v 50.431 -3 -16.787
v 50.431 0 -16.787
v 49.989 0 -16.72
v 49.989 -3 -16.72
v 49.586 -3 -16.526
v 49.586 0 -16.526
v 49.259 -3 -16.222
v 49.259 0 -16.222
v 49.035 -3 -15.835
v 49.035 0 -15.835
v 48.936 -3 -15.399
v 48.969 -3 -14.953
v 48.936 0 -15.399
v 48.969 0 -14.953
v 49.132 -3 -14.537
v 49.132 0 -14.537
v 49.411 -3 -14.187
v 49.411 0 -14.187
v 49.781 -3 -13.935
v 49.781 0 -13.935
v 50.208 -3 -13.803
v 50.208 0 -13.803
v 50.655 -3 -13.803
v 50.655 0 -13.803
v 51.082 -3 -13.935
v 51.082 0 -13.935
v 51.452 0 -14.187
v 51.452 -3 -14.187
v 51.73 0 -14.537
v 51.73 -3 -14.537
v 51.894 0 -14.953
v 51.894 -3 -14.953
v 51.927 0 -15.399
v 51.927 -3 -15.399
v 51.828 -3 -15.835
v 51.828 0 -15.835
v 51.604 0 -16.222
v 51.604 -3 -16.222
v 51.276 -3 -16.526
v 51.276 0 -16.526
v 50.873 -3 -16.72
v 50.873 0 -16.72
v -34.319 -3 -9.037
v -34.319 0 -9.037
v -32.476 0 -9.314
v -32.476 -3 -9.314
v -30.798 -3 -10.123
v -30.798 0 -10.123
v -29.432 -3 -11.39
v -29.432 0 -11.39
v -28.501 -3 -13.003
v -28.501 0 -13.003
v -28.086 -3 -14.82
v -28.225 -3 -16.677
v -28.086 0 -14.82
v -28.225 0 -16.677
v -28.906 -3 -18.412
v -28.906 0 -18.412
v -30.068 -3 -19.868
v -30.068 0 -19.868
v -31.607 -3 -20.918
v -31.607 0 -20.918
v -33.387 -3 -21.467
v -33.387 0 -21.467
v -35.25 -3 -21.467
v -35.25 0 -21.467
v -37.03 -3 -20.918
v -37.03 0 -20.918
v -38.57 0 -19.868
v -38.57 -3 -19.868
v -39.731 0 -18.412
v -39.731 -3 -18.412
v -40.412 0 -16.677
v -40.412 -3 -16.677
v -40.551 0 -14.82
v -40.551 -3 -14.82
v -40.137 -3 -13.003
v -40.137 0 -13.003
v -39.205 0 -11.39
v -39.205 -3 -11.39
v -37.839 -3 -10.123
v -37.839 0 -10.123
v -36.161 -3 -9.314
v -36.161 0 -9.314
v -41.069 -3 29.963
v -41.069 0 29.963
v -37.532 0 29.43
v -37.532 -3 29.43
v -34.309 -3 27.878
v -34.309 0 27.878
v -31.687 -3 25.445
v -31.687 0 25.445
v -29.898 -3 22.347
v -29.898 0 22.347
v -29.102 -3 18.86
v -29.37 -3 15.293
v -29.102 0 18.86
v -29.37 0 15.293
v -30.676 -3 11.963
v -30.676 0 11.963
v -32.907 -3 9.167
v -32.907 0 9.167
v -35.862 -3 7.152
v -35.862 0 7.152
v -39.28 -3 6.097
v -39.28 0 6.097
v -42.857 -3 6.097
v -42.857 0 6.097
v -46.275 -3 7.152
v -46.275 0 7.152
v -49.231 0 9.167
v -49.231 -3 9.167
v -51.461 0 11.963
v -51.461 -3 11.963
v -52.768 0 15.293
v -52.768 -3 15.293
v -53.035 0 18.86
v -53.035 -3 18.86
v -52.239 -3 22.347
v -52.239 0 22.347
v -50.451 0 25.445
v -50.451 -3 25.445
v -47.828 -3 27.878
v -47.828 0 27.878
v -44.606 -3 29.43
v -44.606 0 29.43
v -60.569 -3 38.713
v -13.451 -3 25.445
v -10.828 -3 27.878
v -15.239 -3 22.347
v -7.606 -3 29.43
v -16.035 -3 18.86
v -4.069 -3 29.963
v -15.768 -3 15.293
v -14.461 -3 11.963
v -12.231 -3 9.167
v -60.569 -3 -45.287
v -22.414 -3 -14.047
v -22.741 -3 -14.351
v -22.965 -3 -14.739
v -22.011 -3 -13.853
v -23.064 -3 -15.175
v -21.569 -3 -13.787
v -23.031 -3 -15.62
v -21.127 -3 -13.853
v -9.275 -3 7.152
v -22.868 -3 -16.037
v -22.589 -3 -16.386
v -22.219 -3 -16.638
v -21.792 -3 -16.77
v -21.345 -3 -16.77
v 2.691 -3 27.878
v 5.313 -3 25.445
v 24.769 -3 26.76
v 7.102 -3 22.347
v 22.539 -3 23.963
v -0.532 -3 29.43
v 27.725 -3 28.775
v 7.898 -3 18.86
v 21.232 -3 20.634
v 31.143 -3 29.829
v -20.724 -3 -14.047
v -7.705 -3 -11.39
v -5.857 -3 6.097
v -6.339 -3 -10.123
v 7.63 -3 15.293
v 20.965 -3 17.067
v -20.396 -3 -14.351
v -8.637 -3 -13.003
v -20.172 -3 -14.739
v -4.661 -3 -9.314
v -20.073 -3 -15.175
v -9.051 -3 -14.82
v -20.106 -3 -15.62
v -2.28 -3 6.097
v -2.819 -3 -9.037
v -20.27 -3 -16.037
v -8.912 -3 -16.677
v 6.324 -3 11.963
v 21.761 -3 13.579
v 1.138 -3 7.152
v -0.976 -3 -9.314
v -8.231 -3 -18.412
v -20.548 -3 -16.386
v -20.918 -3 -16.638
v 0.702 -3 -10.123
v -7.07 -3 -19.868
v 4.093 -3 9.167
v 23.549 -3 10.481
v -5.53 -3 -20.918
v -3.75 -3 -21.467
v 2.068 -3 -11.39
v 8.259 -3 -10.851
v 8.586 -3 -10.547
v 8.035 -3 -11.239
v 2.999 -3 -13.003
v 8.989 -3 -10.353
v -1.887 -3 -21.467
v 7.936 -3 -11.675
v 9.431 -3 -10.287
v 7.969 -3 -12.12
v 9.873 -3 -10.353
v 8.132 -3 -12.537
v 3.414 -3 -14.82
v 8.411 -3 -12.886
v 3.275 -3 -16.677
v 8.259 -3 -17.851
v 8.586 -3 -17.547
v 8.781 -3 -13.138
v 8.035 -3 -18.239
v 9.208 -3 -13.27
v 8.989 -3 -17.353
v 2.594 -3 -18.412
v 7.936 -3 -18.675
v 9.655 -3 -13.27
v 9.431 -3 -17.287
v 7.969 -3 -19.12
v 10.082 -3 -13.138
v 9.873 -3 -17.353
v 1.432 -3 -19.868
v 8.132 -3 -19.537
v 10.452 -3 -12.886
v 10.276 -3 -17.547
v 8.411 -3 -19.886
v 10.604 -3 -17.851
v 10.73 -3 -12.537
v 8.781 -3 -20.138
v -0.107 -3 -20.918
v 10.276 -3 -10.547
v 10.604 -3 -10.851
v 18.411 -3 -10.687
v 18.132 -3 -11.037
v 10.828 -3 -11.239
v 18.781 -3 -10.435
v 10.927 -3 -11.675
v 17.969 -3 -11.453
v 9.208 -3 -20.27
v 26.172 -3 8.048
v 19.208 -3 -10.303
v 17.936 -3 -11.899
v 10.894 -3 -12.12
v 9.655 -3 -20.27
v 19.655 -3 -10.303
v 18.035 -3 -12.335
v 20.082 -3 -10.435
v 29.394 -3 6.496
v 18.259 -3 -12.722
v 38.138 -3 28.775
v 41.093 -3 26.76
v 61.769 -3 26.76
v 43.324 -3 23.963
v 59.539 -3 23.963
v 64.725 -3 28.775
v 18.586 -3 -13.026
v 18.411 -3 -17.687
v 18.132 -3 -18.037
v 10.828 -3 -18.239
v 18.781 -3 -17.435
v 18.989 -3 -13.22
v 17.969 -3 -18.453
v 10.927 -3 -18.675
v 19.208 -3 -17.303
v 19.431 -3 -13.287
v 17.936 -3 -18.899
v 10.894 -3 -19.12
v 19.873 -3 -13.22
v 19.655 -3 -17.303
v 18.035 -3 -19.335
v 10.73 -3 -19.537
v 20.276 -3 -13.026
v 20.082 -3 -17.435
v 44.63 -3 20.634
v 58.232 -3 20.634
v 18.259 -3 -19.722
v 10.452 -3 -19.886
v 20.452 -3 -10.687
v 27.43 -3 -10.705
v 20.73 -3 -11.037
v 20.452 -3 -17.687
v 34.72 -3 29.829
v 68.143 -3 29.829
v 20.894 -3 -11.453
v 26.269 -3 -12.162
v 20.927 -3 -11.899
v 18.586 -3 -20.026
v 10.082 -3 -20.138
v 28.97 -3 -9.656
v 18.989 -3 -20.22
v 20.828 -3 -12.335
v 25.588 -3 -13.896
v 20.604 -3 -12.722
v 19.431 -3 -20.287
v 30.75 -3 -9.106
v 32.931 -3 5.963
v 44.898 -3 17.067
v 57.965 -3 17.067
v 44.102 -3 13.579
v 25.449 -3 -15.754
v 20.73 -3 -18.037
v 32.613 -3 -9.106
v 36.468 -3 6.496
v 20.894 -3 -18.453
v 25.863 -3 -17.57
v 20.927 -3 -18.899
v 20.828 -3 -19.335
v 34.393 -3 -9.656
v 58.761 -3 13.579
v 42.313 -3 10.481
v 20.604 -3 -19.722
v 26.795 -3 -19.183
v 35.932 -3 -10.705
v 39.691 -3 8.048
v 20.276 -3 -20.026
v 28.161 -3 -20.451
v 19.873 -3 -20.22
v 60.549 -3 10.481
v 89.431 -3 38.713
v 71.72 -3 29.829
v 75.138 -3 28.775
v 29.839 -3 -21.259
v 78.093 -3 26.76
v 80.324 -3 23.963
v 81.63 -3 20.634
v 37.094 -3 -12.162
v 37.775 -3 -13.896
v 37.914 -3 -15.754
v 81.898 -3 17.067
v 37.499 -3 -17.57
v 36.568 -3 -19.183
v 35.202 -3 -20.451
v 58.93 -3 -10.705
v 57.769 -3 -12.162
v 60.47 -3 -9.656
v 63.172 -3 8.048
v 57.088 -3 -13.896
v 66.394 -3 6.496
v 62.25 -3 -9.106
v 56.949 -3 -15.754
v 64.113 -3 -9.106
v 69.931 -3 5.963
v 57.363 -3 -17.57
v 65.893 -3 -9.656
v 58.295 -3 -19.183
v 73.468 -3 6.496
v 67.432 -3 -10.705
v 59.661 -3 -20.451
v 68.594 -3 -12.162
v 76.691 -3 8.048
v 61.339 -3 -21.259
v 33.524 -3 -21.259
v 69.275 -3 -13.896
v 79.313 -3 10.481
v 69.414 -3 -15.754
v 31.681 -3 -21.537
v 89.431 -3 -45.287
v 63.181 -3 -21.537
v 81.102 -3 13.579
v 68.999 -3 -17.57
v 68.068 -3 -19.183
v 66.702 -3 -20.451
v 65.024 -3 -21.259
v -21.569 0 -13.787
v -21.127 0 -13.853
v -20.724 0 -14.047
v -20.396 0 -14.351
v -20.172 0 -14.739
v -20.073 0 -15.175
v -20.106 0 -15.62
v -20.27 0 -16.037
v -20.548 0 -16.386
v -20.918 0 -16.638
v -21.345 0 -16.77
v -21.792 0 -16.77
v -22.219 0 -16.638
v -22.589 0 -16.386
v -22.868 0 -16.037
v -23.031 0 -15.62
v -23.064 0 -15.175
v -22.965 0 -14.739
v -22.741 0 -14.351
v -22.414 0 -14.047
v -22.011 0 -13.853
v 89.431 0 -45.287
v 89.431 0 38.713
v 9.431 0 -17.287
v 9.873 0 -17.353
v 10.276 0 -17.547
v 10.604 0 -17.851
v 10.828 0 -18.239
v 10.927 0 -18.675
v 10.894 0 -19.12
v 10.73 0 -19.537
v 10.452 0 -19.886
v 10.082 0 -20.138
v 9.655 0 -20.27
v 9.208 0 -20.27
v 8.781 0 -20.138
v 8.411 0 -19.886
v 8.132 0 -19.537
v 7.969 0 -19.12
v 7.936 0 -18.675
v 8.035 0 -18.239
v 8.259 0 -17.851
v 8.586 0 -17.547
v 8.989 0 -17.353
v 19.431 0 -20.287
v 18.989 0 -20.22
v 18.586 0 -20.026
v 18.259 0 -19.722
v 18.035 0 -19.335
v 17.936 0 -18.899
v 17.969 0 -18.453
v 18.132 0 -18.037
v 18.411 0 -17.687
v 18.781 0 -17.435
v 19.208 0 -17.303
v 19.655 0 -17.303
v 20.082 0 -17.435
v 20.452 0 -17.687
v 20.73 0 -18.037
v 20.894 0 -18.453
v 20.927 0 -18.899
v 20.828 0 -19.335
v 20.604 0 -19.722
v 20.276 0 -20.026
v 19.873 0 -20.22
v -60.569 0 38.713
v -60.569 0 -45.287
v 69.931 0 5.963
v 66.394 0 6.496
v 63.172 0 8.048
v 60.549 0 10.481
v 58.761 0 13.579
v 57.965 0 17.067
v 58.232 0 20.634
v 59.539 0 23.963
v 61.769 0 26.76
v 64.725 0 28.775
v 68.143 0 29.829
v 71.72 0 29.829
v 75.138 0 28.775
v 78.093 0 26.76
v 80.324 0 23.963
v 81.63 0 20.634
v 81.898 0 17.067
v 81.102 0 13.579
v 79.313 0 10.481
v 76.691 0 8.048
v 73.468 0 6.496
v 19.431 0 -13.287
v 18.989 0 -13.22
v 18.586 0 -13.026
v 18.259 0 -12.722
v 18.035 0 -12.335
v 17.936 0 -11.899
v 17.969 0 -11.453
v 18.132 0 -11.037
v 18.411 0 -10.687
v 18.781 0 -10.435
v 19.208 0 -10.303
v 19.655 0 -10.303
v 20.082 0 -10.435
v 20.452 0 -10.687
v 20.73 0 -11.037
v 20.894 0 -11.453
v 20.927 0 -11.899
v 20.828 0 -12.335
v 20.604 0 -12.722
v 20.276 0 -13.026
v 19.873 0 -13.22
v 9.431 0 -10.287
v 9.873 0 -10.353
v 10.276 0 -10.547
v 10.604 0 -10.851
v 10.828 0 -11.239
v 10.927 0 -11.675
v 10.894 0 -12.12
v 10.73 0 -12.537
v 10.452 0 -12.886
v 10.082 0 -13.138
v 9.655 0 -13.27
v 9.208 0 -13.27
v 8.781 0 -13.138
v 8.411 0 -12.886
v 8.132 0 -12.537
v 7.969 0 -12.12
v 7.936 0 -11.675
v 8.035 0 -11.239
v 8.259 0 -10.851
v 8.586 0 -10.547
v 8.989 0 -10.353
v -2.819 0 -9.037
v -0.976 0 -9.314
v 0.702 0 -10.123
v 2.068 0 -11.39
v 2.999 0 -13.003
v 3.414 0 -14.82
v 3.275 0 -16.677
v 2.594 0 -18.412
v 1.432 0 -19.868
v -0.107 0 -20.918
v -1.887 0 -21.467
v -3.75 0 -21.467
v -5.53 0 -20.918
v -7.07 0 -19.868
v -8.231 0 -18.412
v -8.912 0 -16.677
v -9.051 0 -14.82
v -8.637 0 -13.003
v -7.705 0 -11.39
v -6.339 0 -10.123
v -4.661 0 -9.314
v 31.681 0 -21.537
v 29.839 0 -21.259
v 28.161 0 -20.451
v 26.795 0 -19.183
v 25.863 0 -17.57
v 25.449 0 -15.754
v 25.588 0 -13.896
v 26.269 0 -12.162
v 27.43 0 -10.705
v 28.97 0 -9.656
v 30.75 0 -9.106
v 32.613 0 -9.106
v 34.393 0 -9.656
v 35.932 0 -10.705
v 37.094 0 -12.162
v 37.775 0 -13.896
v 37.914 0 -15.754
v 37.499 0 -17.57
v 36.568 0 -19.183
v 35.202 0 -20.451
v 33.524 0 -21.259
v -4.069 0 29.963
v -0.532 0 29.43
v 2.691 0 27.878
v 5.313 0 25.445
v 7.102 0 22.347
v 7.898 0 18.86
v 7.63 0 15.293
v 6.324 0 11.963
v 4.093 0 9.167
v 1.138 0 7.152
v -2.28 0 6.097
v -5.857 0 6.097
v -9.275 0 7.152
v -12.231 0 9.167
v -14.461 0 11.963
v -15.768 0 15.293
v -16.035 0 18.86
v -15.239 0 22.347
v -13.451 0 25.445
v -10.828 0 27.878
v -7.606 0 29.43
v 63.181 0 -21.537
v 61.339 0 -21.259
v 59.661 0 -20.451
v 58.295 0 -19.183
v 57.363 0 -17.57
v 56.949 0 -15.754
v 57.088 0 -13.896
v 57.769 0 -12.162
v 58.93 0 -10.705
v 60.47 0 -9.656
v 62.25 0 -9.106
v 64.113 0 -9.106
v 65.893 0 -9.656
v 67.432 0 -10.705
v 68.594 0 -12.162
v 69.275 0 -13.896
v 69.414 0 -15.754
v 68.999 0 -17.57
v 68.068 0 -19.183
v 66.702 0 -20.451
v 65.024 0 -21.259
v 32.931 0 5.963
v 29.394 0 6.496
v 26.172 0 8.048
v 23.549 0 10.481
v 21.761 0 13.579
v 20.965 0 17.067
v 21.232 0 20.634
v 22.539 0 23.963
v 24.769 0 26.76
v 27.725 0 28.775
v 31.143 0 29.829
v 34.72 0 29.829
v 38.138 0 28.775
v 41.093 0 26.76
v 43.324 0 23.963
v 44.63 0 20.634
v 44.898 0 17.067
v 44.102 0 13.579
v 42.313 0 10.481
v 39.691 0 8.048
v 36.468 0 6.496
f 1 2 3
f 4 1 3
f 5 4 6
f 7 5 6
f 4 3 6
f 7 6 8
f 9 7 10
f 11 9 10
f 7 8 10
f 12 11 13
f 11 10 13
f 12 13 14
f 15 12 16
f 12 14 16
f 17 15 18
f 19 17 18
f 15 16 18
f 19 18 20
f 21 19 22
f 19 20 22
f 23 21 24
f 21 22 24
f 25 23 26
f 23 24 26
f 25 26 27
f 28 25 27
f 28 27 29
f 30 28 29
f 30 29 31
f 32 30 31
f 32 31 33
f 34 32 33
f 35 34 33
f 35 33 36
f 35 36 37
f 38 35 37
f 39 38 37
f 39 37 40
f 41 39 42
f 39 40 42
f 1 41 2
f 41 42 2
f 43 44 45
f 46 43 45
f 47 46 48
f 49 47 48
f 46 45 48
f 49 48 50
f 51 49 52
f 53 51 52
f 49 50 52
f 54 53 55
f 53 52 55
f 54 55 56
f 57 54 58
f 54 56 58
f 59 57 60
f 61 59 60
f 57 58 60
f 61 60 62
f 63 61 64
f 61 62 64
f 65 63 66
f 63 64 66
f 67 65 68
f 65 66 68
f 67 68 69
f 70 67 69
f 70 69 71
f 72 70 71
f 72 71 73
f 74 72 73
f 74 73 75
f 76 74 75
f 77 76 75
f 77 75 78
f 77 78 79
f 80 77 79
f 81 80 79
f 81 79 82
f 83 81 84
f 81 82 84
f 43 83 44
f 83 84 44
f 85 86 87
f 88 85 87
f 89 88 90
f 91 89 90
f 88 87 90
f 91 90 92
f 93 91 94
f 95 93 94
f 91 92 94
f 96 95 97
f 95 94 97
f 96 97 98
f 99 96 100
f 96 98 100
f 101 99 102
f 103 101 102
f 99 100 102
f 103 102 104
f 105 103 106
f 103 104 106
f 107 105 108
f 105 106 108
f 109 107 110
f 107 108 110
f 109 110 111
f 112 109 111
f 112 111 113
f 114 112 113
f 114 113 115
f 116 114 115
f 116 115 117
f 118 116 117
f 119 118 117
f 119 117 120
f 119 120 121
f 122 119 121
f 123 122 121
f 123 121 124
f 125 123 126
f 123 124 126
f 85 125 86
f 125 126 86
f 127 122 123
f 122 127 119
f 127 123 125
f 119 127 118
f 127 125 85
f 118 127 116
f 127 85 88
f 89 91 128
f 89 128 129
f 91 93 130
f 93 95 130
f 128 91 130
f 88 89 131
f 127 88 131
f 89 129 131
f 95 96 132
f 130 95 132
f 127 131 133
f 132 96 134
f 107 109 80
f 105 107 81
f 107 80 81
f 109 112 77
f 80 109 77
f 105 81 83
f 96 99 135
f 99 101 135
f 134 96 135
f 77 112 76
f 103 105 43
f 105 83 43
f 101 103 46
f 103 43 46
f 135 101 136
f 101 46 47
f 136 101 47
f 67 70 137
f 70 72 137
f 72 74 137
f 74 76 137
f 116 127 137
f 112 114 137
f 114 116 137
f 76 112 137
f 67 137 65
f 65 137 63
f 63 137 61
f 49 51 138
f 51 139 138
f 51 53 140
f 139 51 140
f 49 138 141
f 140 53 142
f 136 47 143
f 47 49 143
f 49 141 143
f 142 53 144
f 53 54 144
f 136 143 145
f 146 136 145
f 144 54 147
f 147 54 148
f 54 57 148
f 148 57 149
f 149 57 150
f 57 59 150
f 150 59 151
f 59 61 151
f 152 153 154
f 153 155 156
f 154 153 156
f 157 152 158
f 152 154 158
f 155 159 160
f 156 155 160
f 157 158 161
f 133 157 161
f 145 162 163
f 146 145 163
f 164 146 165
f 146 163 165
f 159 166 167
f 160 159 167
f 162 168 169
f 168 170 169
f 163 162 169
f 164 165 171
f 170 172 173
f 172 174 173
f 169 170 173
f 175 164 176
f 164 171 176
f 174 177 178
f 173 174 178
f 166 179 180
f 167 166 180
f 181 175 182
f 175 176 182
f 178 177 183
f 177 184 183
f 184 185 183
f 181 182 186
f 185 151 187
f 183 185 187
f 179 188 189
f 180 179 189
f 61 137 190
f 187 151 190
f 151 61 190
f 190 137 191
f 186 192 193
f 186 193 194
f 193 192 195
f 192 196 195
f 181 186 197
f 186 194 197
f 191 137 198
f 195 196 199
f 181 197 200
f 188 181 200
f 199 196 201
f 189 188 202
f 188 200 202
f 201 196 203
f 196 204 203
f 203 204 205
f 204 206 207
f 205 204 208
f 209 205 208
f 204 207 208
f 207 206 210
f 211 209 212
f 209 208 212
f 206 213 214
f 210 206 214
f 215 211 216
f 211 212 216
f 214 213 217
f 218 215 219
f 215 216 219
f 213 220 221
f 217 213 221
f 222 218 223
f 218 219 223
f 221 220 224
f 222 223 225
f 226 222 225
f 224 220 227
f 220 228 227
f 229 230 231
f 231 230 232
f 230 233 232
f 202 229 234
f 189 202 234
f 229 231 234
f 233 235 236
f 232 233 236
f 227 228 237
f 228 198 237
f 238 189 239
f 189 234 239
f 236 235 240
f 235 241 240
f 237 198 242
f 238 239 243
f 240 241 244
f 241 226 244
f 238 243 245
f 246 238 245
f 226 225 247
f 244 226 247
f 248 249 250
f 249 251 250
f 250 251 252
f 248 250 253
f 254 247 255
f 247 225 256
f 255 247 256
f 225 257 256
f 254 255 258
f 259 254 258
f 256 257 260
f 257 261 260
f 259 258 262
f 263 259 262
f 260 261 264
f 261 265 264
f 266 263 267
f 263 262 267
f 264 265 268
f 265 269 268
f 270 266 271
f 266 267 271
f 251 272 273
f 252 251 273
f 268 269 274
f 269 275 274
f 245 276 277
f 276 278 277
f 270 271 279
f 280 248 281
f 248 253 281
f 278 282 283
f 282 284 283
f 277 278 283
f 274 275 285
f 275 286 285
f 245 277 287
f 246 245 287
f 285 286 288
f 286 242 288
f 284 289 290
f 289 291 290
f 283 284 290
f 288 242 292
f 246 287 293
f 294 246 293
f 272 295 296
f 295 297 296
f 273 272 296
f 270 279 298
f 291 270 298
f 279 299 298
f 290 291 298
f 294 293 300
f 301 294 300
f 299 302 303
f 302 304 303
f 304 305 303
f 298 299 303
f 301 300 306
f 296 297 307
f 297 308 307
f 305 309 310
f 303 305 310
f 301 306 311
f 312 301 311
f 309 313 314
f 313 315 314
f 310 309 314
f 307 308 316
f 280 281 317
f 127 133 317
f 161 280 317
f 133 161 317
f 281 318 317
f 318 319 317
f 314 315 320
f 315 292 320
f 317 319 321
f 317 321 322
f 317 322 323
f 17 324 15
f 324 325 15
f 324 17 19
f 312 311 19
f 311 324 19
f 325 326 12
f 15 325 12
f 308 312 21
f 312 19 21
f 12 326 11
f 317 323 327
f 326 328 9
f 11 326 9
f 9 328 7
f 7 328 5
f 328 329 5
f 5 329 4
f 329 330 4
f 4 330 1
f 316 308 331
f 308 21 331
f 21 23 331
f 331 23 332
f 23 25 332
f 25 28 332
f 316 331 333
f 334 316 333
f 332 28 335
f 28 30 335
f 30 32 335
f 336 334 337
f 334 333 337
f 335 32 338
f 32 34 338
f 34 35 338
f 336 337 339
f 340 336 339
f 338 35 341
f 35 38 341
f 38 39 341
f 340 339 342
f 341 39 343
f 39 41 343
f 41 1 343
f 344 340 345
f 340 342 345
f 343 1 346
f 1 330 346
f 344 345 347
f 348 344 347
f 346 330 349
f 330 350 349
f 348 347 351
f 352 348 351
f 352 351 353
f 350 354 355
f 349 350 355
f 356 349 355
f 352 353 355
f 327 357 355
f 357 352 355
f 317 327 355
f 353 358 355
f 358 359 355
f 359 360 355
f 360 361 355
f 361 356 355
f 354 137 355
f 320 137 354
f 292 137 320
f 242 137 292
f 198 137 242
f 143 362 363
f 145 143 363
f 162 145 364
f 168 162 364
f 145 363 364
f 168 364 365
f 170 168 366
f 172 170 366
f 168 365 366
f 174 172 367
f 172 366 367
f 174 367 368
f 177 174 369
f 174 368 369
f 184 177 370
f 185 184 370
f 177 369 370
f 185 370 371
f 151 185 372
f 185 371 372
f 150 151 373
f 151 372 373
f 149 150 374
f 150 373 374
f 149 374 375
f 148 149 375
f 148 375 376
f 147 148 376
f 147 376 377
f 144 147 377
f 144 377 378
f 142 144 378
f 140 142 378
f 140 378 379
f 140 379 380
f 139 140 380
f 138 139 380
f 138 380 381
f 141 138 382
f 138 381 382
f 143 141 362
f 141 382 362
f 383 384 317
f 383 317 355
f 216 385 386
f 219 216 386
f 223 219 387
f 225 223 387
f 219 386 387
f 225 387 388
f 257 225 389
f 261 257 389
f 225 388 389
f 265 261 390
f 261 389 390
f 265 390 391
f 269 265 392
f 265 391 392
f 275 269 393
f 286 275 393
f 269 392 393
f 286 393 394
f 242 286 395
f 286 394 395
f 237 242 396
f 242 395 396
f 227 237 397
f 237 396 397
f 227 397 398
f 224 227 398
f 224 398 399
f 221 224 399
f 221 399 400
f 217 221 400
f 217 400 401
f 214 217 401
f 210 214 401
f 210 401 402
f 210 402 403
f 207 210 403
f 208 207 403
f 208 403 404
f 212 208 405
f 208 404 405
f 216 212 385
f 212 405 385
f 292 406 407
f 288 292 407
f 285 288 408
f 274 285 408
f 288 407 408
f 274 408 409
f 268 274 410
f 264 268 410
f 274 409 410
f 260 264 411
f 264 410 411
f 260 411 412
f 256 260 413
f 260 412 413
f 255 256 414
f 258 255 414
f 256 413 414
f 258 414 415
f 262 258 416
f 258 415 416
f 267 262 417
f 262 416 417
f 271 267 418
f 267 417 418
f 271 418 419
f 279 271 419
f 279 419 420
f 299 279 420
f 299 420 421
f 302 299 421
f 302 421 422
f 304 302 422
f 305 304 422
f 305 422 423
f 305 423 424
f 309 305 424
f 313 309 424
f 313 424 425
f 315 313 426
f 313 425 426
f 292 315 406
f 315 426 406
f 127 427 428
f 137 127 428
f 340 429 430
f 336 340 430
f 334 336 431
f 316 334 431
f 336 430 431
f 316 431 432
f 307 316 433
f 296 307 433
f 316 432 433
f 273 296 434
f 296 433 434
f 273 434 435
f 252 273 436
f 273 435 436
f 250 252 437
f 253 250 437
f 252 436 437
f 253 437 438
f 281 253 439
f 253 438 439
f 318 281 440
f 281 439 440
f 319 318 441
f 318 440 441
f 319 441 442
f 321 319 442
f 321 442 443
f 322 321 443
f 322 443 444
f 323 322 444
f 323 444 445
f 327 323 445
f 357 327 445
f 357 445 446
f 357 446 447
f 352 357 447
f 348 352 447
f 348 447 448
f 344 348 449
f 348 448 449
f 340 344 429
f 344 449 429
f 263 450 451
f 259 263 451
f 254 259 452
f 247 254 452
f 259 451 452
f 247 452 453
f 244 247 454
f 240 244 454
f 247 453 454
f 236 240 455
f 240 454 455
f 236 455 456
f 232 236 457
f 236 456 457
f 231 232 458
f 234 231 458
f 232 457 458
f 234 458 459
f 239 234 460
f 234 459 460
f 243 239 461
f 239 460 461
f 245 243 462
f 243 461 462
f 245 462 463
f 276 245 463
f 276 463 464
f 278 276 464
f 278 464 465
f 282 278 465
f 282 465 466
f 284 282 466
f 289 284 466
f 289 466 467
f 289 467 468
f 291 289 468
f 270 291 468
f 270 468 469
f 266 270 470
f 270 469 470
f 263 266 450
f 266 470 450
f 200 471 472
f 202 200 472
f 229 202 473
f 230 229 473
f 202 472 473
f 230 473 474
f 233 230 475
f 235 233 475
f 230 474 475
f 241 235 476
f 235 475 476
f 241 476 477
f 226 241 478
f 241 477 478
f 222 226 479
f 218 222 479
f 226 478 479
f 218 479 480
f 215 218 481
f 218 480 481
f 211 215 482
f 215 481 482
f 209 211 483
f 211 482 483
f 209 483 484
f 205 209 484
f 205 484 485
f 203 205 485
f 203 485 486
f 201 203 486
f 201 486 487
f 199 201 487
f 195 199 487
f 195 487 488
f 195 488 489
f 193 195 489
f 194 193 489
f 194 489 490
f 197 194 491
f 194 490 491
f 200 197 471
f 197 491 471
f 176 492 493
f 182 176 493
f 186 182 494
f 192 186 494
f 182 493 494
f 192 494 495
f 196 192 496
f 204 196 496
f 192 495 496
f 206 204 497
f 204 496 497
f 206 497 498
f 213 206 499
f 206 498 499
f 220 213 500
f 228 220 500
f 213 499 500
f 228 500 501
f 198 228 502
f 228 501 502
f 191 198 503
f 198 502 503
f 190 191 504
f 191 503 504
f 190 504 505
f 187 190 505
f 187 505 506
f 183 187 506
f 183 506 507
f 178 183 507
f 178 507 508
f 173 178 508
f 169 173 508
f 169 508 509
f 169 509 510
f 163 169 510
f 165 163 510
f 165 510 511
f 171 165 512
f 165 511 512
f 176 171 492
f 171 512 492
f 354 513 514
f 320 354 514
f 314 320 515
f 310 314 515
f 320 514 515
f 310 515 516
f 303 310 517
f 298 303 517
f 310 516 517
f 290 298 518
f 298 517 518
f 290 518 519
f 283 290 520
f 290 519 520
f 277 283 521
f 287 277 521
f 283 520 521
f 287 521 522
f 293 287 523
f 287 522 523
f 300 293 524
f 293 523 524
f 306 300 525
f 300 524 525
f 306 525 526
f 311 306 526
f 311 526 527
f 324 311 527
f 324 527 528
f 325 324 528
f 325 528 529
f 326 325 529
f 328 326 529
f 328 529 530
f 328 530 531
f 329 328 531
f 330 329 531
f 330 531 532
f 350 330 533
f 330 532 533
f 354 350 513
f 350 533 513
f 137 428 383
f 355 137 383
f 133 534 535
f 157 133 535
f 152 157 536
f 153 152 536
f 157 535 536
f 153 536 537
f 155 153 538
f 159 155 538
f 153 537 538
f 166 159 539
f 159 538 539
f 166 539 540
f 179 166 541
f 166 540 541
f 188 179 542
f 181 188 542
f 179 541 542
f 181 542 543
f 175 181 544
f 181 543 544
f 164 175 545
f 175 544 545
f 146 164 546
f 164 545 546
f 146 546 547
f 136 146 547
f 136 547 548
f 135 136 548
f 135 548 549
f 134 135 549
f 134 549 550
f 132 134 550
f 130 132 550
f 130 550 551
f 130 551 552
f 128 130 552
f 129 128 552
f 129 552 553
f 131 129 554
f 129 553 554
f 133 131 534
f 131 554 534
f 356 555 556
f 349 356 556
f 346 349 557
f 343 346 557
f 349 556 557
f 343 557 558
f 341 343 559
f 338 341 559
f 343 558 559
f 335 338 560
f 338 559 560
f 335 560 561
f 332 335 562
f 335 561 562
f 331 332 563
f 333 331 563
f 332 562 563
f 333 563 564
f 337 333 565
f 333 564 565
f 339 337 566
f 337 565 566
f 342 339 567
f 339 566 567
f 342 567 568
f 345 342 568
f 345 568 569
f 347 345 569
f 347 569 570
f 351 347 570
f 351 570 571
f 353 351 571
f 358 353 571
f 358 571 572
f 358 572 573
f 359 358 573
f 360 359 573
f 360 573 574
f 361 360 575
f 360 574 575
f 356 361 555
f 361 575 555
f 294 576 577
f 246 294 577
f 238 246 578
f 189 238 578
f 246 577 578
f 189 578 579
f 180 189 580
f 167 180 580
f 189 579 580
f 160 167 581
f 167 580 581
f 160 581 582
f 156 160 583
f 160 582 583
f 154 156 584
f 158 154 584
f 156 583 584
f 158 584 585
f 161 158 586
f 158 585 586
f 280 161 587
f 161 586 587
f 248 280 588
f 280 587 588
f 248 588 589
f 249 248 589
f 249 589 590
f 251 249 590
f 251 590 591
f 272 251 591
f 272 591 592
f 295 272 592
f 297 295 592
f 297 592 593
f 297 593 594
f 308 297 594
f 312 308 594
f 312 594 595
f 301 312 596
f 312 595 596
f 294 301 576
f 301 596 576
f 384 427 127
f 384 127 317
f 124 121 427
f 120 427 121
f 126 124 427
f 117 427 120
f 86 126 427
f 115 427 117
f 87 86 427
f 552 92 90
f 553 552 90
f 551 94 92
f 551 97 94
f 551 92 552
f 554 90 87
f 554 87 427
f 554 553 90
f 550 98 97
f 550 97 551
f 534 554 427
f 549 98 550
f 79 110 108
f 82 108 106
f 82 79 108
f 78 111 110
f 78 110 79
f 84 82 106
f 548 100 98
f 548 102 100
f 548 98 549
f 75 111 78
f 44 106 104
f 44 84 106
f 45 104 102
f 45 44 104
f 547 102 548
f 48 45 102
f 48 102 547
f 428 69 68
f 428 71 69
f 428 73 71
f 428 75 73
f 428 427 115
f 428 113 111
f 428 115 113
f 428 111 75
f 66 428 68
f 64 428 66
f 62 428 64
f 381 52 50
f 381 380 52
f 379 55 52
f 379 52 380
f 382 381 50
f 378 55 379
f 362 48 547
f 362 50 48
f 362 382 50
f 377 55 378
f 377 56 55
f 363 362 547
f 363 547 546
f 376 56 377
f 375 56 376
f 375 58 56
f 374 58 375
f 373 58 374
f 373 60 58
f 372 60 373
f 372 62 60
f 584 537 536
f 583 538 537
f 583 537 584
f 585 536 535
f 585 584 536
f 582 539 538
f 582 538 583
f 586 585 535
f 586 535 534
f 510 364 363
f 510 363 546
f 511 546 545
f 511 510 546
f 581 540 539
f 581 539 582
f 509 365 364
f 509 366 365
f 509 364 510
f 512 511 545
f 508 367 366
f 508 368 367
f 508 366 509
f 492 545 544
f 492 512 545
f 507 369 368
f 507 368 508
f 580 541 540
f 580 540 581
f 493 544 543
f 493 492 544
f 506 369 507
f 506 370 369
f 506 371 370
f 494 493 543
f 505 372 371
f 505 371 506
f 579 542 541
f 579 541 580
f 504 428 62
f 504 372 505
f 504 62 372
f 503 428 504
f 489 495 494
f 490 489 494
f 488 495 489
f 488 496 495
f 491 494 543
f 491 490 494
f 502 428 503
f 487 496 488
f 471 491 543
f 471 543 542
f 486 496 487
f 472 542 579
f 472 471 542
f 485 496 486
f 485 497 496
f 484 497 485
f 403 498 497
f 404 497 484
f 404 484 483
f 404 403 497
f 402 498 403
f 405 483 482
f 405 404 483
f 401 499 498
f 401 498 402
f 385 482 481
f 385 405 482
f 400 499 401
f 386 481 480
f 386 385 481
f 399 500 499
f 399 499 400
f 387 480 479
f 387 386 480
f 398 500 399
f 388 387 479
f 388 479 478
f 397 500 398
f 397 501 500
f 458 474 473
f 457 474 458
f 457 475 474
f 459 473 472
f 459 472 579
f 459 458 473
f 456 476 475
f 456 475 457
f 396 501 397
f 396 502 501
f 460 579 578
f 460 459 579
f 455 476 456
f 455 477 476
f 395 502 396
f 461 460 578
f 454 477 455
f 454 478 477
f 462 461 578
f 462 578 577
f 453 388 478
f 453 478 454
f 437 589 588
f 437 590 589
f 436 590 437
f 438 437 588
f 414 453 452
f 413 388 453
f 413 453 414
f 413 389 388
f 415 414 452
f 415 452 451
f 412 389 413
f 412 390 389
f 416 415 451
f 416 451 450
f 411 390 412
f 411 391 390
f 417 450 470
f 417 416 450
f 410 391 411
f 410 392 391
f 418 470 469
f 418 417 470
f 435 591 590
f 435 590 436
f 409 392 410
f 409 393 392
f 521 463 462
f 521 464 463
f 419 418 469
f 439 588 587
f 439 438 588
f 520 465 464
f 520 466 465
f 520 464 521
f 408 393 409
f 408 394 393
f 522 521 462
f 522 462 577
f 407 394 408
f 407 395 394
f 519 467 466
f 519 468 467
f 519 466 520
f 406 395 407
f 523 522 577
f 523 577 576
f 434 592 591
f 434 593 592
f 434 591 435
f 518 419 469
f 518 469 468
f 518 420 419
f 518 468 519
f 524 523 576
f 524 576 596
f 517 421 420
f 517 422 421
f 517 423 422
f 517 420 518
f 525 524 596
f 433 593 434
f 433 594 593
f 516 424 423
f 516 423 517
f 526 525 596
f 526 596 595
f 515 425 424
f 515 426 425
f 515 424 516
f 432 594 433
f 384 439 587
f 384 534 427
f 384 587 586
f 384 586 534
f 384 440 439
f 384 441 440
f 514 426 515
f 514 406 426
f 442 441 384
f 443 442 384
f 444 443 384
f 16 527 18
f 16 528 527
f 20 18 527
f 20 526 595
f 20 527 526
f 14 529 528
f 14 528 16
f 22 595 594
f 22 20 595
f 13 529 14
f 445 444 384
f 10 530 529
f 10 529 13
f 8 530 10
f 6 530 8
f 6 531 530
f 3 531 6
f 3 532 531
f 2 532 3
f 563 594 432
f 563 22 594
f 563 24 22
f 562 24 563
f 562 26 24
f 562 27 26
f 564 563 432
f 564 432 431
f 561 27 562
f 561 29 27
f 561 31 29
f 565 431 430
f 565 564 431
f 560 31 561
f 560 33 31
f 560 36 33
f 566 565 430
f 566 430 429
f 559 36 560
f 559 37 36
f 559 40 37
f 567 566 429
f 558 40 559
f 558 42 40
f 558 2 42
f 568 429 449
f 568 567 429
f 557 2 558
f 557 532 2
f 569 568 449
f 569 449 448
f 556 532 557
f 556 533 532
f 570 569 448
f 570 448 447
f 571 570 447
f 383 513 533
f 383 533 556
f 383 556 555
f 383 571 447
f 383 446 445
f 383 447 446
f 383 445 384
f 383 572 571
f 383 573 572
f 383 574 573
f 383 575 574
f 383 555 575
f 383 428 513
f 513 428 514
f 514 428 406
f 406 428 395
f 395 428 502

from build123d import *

# Parameters (mm, degrees)
SKETCH1_W           = 150
SKETCH1_H           = 84
SKETCH1_R           = 12
SKETCH1_R_2         = 6.25
SKETCH1_R_3         = 1.5
BOSS_EXTRUDE2_DEPTH = 3


with BuildPart() as part:
    # Sketch1 → Boss-Extrude2 (new body)
    with BuildSketch(Plane(origin=(0, 0, 0), x_dir=(1, 0, 0), z_dir=(0, 1, 0))):
        with Locations((14.43134335, 3.286639095)):
            Rectangle(SKETCH1_W, SKETCH1_H)
        with Locations(Location((-41.06865665, -17.963360905, 0), (0, 0, 270))):
            Circle(SKETCH1_R, mode=Mode.SUBTRACT)
        with Locations(Location((-4.06865665, -17.963360905, 0), (0, 0, 270))):
            Circle(SKETCH1_R, mode=Mode.SUBTRACT)
        with Locations(Location((-34.31865665, 15.286639095, 0), (0, 0, 270))):
            Circle(SKETCH1_R_2, mode=Mode.SUBTRACT)
        with Locations(Location((-21.56865665, 15.286639095, 0), (0, 0, 270))):
            Circle(SKETCH1_R_3, mode=Mode.SUBTRACT)
        with Locations(Location((-2.81865665, 15.286639095, 0), (0, 0, 270))):
            Circle(SKETCH1_R_2, mode=Mode.SUBTRACT)
        with Locations(Location((9.43134335, 18.786639095, 0), (0, 0, 270))):
            Circle(SKETCH1_R_3, mode=Mode.SUBTRACT)
        with Locations(Location((9.43134335, 11.786639095, 0), (0, 0, 270))):
            Circle(SKETCH1_R_3, mode=Mode.SUBTRACT)
        with Locations(Location((69.93134335, -17.963360905, 0), (0, 0, 90))):
            Circle(SKETCH1_R, mode=Mode.SUBTRACT)
        with Locations(Location((32.93134335, -17.963360905, 0), (0, 0, 90))):
            Circle(SKETCH1_R, mode=Mode.SUBTRACT)
        with Locations(Location((19.43134335, 11.786639095, 0), (0, 0, 90))):
            Circle(SKETCH1_R_3, mode=Mode.SUBTRACT)
        with Locations(Location((19.43134335, 18.786639095, 0), (0, 0, 90))):
            Circle(SKETCH1_R_3, mode=Mode.SUBTRACT)
        with Locations(Location((31.68134335, 15.286639095, 0), (0, 0, 90))):
            Circle(SKETCH1_R_2, mode=Mode.SUBTRACT)
        with Locations(Location((50.43134335, 15.286639095, 0), (0, 0, 90))):
            Circle(SKETCH1_R_3, mode=Mode.SUBTRACT)
        with Locations(Location((63.18134335, 15.286639095, 0), (0, 0, 90))):
            Circle(SKETCH1_R_2, mode=Mode.SUBTRACT)
    extrude(amount=-BOSS_EXTRUDE2_DEPTH)


solid = part.part
